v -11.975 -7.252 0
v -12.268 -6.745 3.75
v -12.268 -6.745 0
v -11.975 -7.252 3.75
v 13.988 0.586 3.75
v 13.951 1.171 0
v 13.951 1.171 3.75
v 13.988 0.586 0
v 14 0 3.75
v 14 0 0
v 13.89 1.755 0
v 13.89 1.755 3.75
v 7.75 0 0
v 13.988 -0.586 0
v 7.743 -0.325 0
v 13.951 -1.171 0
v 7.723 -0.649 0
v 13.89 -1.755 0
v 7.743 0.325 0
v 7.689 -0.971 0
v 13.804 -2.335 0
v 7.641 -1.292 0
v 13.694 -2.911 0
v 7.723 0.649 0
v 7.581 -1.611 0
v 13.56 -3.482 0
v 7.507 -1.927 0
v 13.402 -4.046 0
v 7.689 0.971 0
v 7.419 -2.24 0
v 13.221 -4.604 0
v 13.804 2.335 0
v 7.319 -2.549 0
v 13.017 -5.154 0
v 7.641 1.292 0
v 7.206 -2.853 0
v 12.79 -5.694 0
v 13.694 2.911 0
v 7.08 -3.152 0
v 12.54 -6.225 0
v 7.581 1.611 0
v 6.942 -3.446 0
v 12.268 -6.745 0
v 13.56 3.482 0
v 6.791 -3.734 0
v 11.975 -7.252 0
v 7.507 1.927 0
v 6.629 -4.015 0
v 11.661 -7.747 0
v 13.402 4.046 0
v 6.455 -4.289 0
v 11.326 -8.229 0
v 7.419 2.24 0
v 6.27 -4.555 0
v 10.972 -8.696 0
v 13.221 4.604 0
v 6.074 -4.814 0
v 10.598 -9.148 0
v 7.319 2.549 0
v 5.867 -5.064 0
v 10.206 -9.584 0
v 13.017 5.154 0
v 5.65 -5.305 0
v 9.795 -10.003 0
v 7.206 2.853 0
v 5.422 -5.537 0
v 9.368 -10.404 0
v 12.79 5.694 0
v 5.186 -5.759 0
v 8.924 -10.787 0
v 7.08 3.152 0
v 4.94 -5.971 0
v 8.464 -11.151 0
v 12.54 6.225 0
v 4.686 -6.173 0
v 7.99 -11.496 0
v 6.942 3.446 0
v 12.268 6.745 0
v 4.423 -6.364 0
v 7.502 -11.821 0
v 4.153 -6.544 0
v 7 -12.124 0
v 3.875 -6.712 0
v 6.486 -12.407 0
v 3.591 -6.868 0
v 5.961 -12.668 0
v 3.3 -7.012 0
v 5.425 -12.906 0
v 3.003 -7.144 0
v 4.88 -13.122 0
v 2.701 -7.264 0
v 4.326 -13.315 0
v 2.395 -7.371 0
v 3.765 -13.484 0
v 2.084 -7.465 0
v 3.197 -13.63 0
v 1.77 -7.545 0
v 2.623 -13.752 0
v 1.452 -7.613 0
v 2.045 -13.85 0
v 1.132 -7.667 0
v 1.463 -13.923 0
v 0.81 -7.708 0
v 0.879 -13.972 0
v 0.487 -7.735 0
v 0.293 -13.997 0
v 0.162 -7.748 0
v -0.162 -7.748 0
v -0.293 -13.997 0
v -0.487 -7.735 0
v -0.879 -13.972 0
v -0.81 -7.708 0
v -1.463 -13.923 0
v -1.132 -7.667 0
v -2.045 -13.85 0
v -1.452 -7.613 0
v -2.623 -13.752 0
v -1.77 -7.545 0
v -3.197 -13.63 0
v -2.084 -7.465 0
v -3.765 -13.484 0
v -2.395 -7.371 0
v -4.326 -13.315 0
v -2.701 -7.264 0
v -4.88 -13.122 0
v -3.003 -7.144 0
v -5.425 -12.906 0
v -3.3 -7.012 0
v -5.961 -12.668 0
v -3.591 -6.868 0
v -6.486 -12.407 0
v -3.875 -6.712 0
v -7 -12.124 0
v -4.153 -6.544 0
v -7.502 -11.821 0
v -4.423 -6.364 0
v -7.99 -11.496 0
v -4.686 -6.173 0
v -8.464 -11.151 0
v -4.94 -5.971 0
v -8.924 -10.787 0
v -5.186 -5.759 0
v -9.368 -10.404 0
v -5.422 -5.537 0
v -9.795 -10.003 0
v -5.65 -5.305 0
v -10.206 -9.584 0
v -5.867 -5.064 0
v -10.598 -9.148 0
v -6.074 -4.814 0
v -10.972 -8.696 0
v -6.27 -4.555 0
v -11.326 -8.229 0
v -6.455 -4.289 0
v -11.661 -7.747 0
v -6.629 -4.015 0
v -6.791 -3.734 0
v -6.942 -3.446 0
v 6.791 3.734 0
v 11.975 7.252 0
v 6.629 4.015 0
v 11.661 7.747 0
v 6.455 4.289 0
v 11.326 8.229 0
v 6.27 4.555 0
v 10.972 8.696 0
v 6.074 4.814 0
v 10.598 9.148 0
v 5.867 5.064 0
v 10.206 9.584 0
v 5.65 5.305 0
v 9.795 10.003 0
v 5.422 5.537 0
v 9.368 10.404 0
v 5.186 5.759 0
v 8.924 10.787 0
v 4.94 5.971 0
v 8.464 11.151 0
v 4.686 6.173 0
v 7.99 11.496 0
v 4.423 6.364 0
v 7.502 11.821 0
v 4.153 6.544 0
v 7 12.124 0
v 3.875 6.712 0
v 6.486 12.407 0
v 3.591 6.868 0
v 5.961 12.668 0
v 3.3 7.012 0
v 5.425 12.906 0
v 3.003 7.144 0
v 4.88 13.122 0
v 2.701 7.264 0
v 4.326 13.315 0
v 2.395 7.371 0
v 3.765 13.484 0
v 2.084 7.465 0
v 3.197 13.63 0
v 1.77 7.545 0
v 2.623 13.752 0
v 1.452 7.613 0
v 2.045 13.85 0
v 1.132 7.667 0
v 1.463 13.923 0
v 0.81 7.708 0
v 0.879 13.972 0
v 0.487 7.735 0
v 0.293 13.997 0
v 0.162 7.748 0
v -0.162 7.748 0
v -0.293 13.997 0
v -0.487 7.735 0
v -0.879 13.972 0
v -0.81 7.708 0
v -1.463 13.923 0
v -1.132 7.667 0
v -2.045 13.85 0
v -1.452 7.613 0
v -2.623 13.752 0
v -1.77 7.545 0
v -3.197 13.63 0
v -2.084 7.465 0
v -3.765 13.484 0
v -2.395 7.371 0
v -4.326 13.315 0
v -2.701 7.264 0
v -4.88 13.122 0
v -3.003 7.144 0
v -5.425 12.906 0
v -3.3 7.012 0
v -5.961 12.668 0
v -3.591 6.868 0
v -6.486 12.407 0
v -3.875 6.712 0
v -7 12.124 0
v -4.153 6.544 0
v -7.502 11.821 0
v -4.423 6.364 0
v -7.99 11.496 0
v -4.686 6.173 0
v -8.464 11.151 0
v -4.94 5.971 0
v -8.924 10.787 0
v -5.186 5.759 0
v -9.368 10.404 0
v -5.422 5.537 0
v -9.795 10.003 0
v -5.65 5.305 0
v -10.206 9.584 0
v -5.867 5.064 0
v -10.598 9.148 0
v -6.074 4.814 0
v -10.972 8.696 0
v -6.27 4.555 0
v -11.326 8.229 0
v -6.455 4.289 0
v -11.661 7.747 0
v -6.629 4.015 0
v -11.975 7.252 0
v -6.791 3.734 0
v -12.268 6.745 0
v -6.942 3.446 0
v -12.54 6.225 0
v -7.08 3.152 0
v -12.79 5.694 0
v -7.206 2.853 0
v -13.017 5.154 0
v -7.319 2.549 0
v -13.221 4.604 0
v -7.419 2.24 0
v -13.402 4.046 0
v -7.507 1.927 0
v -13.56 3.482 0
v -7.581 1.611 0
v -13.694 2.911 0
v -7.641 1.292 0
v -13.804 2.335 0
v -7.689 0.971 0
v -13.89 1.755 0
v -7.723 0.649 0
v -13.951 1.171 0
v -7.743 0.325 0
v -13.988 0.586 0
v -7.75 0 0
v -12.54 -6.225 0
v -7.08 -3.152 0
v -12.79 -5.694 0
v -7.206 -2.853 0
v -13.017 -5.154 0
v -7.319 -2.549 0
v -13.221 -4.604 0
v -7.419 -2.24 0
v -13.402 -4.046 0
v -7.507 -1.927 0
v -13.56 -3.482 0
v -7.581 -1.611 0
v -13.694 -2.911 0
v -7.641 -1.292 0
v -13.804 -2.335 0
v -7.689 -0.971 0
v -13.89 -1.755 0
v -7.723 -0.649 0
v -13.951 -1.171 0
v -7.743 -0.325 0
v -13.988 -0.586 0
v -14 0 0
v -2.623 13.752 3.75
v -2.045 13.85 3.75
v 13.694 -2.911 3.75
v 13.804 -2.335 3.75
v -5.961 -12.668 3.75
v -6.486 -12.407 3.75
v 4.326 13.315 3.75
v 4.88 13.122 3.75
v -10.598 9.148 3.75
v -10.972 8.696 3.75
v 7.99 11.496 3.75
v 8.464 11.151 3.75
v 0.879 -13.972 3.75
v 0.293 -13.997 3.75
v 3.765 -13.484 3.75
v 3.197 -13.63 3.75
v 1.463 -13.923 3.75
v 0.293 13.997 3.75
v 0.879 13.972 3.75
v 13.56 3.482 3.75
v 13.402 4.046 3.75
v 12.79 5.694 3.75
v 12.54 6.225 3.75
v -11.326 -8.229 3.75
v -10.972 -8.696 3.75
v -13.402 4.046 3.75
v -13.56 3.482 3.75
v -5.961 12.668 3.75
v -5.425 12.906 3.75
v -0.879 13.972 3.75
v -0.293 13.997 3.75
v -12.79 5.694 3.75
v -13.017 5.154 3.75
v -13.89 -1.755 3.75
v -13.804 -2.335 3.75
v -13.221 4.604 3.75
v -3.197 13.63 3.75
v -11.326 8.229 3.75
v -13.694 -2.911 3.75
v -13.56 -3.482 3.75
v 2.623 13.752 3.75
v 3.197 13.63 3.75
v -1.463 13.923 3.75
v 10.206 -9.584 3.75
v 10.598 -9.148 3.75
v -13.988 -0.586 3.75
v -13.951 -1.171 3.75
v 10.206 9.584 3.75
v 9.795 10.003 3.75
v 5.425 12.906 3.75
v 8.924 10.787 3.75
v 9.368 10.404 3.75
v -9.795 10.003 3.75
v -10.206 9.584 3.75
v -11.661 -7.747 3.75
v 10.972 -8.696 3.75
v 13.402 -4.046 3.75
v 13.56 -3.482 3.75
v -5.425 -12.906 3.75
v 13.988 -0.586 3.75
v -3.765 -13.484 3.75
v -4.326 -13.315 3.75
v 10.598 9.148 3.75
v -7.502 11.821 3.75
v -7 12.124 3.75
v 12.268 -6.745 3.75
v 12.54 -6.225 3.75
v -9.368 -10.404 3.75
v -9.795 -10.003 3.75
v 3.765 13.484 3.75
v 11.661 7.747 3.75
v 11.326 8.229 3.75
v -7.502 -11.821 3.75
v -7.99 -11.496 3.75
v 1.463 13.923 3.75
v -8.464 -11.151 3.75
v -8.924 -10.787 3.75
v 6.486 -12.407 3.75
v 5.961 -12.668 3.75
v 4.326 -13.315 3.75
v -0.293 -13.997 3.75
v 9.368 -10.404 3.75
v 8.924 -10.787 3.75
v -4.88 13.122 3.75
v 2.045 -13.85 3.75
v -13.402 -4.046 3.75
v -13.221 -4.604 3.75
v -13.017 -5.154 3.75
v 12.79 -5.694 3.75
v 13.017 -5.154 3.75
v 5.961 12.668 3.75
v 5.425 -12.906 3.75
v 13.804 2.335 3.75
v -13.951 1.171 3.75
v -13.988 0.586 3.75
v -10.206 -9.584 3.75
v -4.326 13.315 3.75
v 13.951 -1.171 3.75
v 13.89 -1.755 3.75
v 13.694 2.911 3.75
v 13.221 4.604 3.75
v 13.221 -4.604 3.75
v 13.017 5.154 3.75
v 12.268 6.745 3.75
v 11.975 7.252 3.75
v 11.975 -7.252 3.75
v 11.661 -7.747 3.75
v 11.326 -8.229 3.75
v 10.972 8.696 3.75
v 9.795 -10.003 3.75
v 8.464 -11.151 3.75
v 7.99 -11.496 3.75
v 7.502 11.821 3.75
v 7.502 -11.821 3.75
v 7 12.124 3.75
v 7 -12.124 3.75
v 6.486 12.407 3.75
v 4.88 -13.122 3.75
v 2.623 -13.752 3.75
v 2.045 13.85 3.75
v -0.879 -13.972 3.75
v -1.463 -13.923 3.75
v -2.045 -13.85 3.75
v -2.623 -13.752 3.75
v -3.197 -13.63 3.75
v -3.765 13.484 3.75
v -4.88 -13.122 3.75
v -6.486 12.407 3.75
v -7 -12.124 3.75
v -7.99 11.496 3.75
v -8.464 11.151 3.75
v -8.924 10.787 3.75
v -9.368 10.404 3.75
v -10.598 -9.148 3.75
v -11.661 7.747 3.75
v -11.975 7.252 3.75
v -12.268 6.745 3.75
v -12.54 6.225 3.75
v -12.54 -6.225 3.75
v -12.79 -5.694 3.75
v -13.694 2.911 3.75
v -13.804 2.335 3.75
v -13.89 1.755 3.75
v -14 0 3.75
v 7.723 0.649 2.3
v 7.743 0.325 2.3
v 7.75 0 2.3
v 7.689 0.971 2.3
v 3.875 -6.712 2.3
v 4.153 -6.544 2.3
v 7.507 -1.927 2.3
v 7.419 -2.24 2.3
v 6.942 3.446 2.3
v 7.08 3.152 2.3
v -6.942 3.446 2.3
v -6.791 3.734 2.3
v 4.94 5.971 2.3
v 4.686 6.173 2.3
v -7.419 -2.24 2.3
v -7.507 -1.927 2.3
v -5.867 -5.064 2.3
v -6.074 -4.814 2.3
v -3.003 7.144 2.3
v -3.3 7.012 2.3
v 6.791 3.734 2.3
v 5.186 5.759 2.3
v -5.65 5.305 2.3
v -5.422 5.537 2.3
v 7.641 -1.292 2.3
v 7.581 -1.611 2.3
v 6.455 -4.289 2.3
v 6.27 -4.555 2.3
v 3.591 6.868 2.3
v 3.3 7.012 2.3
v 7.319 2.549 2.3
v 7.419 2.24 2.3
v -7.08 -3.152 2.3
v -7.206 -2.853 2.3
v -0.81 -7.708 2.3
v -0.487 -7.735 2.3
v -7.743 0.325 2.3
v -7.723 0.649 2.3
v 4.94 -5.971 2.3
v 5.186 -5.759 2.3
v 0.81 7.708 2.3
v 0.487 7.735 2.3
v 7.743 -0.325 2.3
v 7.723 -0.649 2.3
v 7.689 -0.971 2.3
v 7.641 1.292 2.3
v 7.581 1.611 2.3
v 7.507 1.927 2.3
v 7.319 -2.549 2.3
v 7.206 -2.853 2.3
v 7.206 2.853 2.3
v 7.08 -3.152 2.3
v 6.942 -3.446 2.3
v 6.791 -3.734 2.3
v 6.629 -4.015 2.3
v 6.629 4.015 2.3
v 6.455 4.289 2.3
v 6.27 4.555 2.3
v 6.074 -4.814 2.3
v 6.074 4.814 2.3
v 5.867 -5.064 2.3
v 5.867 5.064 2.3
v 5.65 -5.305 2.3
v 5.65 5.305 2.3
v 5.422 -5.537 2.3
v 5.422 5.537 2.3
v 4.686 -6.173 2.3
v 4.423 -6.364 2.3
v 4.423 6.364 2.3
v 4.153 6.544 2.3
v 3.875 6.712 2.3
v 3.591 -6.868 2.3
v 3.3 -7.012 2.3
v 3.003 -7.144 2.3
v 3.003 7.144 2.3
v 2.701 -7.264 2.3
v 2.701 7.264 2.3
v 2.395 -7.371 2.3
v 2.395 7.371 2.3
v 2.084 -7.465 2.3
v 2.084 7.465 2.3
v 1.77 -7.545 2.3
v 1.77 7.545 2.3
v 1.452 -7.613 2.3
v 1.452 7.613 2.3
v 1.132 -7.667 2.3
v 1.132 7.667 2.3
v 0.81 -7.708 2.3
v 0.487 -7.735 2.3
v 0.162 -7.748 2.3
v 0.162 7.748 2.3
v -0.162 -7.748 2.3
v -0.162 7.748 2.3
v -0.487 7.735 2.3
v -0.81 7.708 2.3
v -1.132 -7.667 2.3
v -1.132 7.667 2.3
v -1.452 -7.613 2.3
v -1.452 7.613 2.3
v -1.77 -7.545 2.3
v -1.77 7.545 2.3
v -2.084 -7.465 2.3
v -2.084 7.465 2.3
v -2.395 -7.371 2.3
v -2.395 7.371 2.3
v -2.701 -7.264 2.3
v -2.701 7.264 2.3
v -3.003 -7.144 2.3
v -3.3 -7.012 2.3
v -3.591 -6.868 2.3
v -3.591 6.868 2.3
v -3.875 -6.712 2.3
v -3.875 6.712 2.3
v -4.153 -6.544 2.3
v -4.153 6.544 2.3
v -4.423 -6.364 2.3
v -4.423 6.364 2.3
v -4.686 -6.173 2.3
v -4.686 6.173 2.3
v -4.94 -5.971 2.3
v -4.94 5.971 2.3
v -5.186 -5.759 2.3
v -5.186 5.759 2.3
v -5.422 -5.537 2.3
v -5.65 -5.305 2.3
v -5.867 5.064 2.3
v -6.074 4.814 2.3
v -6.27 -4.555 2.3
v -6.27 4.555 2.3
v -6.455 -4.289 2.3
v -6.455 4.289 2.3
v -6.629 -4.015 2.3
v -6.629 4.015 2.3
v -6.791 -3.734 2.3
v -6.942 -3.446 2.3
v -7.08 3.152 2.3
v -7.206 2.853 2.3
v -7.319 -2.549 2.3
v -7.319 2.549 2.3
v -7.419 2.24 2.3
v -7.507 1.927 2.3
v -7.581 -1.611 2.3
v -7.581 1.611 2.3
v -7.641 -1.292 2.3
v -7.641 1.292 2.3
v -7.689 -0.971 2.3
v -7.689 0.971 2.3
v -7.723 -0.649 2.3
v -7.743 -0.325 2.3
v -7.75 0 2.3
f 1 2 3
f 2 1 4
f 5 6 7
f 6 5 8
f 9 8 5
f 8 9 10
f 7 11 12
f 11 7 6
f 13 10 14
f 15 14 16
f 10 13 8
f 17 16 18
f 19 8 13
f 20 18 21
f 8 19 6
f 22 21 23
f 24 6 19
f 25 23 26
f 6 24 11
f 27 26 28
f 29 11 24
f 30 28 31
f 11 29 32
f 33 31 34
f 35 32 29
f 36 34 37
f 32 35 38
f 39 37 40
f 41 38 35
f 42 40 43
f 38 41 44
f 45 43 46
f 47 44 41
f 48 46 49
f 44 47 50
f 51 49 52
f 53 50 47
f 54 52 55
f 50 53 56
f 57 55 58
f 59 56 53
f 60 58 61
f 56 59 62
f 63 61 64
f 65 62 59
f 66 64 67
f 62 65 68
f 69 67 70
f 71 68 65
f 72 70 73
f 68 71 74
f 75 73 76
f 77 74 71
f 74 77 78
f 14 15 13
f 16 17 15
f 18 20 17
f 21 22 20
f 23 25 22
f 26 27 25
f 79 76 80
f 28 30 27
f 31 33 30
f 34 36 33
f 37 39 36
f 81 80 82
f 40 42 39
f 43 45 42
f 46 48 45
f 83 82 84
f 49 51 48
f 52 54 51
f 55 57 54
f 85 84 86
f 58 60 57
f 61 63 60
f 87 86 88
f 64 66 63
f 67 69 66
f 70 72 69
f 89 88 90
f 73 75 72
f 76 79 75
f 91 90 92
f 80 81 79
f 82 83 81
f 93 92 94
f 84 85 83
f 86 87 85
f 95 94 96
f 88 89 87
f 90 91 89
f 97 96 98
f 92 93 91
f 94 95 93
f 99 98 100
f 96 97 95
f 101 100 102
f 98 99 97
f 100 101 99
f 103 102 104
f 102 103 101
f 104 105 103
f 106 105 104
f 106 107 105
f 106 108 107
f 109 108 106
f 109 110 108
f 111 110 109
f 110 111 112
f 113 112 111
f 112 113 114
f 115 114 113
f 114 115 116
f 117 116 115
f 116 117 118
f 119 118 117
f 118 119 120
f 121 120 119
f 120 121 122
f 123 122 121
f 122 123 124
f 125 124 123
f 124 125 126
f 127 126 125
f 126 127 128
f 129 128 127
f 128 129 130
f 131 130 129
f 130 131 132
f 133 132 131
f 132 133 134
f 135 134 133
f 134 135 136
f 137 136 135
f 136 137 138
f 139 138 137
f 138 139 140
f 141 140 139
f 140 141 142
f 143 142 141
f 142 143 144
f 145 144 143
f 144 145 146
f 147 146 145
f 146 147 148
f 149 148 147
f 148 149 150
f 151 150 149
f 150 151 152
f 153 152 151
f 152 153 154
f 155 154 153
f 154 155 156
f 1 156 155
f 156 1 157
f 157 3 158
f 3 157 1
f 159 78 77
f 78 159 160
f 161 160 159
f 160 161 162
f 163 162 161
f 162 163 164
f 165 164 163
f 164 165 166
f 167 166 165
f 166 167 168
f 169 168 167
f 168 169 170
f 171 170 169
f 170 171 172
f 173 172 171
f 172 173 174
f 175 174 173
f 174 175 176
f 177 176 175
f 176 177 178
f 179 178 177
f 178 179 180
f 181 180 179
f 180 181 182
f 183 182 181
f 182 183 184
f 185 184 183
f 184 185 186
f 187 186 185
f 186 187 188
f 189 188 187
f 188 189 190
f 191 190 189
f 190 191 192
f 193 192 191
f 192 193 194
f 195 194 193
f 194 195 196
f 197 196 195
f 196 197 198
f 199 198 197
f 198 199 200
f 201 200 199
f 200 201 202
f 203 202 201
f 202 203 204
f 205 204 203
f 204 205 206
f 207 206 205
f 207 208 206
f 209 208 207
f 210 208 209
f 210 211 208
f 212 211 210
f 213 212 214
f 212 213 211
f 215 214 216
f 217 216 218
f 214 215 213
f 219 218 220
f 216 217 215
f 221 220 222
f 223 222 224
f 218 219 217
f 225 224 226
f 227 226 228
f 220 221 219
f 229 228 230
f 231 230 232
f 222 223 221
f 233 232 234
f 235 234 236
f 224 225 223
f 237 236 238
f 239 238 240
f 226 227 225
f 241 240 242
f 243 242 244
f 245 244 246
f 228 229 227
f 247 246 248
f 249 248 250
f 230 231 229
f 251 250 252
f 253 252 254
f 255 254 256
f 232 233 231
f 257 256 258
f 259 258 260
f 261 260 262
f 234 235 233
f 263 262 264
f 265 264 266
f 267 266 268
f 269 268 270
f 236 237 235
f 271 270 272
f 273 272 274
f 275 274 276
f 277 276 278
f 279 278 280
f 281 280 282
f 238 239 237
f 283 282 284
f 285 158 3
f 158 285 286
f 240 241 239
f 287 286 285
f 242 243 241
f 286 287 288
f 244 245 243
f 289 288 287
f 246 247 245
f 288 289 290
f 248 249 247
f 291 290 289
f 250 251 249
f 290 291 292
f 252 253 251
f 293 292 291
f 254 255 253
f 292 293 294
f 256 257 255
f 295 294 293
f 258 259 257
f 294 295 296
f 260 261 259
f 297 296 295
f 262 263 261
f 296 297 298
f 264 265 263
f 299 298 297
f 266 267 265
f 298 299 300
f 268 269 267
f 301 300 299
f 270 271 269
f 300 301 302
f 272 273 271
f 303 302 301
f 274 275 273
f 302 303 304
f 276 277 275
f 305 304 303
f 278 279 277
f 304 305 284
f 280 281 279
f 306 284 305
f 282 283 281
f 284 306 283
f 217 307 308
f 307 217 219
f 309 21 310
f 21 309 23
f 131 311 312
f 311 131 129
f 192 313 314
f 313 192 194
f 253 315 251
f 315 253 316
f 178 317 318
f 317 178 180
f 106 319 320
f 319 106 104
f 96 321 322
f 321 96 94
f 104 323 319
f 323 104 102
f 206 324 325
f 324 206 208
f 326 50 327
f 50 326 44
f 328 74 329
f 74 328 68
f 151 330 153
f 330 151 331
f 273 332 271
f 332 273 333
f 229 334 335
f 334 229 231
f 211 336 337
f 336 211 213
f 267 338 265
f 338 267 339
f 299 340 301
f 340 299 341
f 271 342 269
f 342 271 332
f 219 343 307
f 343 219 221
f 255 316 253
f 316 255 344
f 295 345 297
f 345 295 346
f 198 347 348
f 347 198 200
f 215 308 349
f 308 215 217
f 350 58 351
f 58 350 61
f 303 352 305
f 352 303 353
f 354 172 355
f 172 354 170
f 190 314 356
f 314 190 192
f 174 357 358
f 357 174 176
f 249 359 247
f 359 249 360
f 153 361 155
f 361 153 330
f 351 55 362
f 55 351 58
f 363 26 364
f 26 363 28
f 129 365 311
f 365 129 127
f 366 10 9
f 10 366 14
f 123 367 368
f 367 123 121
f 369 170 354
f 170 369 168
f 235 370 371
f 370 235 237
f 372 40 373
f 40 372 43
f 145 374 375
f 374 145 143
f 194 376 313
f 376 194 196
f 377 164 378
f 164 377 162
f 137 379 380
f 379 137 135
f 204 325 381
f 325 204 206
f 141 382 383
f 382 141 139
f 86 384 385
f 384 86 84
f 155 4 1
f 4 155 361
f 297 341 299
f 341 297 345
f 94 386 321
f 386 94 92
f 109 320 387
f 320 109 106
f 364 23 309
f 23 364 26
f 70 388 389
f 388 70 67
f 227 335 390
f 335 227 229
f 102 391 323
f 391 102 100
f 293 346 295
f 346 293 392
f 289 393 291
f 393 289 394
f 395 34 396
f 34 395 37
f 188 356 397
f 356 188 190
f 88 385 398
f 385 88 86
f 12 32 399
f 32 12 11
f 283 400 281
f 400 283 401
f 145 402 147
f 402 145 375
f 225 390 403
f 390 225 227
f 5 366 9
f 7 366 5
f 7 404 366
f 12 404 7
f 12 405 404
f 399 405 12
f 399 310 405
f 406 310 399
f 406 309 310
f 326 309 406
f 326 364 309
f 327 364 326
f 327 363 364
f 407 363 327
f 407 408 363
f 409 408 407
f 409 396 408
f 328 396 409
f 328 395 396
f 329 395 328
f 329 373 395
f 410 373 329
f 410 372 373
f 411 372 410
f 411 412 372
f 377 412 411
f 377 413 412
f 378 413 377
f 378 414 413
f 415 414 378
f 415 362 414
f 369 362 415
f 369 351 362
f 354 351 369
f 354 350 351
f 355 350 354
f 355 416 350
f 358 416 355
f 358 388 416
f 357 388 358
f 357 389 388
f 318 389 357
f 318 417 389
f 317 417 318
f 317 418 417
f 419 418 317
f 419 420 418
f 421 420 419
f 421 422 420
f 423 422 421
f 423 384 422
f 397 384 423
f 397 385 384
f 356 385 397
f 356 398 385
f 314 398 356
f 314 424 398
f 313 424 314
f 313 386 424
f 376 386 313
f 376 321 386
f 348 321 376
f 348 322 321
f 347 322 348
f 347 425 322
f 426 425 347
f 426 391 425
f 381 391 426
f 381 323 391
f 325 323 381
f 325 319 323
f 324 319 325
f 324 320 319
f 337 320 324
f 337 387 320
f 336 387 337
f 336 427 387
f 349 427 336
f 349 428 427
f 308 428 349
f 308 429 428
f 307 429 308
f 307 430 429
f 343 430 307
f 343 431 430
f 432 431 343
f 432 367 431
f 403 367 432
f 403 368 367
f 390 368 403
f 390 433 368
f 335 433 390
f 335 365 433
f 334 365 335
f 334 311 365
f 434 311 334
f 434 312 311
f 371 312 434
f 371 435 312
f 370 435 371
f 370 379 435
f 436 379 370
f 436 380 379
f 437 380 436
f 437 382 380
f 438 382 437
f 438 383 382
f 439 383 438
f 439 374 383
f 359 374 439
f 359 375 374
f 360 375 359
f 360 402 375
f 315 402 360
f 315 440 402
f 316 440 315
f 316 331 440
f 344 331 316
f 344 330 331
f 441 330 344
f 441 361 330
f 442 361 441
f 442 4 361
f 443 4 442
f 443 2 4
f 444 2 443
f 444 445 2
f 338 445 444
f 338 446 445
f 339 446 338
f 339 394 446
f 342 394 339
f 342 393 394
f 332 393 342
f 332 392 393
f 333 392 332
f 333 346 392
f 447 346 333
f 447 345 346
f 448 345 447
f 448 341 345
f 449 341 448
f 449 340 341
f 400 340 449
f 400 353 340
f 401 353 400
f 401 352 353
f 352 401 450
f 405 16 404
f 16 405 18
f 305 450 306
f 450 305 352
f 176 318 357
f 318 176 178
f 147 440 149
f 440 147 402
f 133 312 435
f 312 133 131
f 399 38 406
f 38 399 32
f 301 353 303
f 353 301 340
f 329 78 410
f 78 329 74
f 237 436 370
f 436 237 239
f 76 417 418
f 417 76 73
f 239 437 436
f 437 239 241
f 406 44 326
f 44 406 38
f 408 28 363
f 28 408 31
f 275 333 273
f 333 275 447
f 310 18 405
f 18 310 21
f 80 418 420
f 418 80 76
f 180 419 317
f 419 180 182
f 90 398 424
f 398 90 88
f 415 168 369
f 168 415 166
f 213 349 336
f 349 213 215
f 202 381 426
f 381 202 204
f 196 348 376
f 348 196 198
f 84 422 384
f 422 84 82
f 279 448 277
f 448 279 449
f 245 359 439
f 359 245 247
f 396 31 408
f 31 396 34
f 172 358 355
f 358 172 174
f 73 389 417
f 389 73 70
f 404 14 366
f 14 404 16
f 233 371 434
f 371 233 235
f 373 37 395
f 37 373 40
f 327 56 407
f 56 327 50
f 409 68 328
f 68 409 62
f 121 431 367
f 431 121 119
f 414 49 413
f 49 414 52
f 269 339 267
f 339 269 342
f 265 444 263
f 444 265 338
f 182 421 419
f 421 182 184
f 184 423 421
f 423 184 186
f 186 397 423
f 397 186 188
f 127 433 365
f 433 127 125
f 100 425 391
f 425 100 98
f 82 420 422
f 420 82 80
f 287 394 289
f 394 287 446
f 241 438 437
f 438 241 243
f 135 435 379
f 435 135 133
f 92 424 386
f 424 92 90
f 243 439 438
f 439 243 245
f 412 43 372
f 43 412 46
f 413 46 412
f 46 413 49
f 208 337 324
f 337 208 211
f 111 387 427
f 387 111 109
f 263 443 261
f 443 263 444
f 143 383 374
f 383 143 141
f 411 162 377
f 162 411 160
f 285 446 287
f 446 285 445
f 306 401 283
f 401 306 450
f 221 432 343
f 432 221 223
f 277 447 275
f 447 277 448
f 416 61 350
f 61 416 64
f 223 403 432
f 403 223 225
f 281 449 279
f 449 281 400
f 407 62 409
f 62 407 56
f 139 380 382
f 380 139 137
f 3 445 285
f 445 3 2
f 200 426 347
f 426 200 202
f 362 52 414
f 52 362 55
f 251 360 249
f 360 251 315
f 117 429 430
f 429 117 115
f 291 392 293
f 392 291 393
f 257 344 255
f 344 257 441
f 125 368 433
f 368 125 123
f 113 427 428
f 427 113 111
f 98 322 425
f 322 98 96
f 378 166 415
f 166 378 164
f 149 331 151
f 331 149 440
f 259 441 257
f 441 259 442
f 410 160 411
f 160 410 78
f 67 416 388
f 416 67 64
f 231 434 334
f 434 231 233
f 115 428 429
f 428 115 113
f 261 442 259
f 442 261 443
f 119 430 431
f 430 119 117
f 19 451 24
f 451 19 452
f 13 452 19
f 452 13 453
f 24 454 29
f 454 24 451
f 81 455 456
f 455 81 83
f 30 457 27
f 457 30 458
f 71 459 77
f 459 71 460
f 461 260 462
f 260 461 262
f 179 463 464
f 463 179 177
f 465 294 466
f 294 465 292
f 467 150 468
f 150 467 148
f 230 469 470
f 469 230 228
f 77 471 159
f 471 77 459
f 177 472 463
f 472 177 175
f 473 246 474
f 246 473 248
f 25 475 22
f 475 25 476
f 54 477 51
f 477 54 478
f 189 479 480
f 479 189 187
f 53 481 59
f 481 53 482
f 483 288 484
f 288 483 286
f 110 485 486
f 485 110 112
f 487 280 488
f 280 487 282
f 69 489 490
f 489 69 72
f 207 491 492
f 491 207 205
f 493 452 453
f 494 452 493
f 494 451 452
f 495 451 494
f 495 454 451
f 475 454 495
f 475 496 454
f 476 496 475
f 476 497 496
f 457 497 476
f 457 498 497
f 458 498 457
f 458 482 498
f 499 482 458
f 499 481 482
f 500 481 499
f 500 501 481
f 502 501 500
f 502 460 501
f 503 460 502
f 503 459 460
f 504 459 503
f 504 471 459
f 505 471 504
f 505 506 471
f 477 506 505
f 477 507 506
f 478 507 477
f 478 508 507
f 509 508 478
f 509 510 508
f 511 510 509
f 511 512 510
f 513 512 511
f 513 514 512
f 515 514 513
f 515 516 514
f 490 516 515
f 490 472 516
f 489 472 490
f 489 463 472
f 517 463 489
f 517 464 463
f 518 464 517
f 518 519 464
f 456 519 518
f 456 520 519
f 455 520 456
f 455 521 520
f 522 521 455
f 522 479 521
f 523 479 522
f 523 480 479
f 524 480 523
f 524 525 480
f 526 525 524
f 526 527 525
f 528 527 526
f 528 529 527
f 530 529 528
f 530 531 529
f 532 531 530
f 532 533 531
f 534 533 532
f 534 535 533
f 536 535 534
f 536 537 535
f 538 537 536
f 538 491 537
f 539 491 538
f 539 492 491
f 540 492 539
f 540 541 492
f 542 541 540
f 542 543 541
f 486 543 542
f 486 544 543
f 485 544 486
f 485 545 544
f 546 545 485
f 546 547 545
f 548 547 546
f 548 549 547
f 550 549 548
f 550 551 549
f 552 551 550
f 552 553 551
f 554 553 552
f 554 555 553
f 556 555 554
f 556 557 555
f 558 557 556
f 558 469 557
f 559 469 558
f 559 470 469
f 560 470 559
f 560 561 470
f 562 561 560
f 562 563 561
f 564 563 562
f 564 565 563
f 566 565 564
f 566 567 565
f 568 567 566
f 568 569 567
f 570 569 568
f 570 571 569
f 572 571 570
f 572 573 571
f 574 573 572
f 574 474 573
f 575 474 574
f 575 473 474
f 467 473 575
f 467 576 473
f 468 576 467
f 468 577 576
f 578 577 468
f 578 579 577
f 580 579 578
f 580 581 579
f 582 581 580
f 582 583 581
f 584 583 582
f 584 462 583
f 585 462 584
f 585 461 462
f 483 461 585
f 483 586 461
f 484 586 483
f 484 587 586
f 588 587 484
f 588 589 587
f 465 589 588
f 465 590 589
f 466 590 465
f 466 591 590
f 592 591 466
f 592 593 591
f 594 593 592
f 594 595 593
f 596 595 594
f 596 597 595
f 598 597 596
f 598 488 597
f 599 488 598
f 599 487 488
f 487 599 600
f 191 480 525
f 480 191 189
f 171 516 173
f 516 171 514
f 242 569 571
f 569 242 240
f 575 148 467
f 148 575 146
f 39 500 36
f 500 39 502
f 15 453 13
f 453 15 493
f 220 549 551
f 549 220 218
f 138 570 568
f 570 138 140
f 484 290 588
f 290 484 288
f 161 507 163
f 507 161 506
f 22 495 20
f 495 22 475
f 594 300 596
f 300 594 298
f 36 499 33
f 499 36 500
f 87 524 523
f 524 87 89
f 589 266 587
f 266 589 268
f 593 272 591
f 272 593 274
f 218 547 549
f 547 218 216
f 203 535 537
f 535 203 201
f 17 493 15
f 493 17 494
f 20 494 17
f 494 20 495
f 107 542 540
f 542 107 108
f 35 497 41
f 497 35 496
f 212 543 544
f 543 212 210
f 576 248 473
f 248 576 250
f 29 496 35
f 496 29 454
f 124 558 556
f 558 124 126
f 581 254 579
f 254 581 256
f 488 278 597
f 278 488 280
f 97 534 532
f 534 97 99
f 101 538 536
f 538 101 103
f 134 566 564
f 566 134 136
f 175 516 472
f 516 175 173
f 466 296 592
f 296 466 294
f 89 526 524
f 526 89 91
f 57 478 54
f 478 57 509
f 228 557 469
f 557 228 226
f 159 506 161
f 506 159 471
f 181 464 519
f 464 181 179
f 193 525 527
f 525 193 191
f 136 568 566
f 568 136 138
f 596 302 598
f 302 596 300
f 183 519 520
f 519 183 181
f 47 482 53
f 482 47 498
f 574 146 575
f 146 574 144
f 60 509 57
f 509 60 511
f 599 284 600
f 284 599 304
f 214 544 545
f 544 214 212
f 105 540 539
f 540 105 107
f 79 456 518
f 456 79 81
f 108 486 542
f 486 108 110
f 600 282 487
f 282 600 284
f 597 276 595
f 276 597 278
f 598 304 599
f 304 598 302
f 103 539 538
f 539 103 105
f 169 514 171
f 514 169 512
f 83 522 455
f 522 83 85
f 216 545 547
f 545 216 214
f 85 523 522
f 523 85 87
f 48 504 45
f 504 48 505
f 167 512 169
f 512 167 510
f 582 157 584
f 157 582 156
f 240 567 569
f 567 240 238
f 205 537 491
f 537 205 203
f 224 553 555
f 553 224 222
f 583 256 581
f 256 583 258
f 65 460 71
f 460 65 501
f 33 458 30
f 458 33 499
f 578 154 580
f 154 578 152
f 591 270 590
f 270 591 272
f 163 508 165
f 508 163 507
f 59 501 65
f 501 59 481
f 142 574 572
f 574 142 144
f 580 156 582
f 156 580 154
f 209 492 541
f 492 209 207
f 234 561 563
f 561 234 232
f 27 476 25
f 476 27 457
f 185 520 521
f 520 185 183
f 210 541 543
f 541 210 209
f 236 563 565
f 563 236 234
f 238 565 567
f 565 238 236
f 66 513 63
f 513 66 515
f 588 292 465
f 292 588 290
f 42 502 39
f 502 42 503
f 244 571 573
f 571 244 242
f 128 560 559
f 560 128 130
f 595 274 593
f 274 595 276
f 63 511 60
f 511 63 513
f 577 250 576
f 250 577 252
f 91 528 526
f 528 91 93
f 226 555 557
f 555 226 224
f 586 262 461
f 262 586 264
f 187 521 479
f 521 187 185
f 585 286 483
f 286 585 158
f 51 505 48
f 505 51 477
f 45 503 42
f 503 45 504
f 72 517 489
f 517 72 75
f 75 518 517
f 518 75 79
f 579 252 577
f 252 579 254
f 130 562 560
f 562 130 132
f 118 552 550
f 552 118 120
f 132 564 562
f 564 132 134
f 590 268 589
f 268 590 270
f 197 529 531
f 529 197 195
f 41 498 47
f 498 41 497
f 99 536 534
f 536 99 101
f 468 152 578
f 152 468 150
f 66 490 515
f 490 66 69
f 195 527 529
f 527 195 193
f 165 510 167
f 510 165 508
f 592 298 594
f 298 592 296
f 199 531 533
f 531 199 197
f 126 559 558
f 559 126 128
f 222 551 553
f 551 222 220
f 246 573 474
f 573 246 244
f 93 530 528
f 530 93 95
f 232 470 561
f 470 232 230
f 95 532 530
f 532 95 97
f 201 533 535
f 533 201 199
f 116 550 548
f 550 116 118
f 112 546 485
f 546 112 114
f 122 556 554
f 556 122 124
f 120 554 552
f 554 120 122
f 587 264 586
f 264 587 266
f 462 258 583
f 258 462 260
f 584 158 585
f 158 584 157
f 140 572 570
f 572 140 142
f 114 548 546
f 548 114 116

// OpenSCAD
$fn = 150;

difference() {
	cylinder(d = 28.0, h = 3.75);
	translate(v = [0, 0, -1]) {
		cylinder(d = 15.5, h = 3.3);
	}
}
